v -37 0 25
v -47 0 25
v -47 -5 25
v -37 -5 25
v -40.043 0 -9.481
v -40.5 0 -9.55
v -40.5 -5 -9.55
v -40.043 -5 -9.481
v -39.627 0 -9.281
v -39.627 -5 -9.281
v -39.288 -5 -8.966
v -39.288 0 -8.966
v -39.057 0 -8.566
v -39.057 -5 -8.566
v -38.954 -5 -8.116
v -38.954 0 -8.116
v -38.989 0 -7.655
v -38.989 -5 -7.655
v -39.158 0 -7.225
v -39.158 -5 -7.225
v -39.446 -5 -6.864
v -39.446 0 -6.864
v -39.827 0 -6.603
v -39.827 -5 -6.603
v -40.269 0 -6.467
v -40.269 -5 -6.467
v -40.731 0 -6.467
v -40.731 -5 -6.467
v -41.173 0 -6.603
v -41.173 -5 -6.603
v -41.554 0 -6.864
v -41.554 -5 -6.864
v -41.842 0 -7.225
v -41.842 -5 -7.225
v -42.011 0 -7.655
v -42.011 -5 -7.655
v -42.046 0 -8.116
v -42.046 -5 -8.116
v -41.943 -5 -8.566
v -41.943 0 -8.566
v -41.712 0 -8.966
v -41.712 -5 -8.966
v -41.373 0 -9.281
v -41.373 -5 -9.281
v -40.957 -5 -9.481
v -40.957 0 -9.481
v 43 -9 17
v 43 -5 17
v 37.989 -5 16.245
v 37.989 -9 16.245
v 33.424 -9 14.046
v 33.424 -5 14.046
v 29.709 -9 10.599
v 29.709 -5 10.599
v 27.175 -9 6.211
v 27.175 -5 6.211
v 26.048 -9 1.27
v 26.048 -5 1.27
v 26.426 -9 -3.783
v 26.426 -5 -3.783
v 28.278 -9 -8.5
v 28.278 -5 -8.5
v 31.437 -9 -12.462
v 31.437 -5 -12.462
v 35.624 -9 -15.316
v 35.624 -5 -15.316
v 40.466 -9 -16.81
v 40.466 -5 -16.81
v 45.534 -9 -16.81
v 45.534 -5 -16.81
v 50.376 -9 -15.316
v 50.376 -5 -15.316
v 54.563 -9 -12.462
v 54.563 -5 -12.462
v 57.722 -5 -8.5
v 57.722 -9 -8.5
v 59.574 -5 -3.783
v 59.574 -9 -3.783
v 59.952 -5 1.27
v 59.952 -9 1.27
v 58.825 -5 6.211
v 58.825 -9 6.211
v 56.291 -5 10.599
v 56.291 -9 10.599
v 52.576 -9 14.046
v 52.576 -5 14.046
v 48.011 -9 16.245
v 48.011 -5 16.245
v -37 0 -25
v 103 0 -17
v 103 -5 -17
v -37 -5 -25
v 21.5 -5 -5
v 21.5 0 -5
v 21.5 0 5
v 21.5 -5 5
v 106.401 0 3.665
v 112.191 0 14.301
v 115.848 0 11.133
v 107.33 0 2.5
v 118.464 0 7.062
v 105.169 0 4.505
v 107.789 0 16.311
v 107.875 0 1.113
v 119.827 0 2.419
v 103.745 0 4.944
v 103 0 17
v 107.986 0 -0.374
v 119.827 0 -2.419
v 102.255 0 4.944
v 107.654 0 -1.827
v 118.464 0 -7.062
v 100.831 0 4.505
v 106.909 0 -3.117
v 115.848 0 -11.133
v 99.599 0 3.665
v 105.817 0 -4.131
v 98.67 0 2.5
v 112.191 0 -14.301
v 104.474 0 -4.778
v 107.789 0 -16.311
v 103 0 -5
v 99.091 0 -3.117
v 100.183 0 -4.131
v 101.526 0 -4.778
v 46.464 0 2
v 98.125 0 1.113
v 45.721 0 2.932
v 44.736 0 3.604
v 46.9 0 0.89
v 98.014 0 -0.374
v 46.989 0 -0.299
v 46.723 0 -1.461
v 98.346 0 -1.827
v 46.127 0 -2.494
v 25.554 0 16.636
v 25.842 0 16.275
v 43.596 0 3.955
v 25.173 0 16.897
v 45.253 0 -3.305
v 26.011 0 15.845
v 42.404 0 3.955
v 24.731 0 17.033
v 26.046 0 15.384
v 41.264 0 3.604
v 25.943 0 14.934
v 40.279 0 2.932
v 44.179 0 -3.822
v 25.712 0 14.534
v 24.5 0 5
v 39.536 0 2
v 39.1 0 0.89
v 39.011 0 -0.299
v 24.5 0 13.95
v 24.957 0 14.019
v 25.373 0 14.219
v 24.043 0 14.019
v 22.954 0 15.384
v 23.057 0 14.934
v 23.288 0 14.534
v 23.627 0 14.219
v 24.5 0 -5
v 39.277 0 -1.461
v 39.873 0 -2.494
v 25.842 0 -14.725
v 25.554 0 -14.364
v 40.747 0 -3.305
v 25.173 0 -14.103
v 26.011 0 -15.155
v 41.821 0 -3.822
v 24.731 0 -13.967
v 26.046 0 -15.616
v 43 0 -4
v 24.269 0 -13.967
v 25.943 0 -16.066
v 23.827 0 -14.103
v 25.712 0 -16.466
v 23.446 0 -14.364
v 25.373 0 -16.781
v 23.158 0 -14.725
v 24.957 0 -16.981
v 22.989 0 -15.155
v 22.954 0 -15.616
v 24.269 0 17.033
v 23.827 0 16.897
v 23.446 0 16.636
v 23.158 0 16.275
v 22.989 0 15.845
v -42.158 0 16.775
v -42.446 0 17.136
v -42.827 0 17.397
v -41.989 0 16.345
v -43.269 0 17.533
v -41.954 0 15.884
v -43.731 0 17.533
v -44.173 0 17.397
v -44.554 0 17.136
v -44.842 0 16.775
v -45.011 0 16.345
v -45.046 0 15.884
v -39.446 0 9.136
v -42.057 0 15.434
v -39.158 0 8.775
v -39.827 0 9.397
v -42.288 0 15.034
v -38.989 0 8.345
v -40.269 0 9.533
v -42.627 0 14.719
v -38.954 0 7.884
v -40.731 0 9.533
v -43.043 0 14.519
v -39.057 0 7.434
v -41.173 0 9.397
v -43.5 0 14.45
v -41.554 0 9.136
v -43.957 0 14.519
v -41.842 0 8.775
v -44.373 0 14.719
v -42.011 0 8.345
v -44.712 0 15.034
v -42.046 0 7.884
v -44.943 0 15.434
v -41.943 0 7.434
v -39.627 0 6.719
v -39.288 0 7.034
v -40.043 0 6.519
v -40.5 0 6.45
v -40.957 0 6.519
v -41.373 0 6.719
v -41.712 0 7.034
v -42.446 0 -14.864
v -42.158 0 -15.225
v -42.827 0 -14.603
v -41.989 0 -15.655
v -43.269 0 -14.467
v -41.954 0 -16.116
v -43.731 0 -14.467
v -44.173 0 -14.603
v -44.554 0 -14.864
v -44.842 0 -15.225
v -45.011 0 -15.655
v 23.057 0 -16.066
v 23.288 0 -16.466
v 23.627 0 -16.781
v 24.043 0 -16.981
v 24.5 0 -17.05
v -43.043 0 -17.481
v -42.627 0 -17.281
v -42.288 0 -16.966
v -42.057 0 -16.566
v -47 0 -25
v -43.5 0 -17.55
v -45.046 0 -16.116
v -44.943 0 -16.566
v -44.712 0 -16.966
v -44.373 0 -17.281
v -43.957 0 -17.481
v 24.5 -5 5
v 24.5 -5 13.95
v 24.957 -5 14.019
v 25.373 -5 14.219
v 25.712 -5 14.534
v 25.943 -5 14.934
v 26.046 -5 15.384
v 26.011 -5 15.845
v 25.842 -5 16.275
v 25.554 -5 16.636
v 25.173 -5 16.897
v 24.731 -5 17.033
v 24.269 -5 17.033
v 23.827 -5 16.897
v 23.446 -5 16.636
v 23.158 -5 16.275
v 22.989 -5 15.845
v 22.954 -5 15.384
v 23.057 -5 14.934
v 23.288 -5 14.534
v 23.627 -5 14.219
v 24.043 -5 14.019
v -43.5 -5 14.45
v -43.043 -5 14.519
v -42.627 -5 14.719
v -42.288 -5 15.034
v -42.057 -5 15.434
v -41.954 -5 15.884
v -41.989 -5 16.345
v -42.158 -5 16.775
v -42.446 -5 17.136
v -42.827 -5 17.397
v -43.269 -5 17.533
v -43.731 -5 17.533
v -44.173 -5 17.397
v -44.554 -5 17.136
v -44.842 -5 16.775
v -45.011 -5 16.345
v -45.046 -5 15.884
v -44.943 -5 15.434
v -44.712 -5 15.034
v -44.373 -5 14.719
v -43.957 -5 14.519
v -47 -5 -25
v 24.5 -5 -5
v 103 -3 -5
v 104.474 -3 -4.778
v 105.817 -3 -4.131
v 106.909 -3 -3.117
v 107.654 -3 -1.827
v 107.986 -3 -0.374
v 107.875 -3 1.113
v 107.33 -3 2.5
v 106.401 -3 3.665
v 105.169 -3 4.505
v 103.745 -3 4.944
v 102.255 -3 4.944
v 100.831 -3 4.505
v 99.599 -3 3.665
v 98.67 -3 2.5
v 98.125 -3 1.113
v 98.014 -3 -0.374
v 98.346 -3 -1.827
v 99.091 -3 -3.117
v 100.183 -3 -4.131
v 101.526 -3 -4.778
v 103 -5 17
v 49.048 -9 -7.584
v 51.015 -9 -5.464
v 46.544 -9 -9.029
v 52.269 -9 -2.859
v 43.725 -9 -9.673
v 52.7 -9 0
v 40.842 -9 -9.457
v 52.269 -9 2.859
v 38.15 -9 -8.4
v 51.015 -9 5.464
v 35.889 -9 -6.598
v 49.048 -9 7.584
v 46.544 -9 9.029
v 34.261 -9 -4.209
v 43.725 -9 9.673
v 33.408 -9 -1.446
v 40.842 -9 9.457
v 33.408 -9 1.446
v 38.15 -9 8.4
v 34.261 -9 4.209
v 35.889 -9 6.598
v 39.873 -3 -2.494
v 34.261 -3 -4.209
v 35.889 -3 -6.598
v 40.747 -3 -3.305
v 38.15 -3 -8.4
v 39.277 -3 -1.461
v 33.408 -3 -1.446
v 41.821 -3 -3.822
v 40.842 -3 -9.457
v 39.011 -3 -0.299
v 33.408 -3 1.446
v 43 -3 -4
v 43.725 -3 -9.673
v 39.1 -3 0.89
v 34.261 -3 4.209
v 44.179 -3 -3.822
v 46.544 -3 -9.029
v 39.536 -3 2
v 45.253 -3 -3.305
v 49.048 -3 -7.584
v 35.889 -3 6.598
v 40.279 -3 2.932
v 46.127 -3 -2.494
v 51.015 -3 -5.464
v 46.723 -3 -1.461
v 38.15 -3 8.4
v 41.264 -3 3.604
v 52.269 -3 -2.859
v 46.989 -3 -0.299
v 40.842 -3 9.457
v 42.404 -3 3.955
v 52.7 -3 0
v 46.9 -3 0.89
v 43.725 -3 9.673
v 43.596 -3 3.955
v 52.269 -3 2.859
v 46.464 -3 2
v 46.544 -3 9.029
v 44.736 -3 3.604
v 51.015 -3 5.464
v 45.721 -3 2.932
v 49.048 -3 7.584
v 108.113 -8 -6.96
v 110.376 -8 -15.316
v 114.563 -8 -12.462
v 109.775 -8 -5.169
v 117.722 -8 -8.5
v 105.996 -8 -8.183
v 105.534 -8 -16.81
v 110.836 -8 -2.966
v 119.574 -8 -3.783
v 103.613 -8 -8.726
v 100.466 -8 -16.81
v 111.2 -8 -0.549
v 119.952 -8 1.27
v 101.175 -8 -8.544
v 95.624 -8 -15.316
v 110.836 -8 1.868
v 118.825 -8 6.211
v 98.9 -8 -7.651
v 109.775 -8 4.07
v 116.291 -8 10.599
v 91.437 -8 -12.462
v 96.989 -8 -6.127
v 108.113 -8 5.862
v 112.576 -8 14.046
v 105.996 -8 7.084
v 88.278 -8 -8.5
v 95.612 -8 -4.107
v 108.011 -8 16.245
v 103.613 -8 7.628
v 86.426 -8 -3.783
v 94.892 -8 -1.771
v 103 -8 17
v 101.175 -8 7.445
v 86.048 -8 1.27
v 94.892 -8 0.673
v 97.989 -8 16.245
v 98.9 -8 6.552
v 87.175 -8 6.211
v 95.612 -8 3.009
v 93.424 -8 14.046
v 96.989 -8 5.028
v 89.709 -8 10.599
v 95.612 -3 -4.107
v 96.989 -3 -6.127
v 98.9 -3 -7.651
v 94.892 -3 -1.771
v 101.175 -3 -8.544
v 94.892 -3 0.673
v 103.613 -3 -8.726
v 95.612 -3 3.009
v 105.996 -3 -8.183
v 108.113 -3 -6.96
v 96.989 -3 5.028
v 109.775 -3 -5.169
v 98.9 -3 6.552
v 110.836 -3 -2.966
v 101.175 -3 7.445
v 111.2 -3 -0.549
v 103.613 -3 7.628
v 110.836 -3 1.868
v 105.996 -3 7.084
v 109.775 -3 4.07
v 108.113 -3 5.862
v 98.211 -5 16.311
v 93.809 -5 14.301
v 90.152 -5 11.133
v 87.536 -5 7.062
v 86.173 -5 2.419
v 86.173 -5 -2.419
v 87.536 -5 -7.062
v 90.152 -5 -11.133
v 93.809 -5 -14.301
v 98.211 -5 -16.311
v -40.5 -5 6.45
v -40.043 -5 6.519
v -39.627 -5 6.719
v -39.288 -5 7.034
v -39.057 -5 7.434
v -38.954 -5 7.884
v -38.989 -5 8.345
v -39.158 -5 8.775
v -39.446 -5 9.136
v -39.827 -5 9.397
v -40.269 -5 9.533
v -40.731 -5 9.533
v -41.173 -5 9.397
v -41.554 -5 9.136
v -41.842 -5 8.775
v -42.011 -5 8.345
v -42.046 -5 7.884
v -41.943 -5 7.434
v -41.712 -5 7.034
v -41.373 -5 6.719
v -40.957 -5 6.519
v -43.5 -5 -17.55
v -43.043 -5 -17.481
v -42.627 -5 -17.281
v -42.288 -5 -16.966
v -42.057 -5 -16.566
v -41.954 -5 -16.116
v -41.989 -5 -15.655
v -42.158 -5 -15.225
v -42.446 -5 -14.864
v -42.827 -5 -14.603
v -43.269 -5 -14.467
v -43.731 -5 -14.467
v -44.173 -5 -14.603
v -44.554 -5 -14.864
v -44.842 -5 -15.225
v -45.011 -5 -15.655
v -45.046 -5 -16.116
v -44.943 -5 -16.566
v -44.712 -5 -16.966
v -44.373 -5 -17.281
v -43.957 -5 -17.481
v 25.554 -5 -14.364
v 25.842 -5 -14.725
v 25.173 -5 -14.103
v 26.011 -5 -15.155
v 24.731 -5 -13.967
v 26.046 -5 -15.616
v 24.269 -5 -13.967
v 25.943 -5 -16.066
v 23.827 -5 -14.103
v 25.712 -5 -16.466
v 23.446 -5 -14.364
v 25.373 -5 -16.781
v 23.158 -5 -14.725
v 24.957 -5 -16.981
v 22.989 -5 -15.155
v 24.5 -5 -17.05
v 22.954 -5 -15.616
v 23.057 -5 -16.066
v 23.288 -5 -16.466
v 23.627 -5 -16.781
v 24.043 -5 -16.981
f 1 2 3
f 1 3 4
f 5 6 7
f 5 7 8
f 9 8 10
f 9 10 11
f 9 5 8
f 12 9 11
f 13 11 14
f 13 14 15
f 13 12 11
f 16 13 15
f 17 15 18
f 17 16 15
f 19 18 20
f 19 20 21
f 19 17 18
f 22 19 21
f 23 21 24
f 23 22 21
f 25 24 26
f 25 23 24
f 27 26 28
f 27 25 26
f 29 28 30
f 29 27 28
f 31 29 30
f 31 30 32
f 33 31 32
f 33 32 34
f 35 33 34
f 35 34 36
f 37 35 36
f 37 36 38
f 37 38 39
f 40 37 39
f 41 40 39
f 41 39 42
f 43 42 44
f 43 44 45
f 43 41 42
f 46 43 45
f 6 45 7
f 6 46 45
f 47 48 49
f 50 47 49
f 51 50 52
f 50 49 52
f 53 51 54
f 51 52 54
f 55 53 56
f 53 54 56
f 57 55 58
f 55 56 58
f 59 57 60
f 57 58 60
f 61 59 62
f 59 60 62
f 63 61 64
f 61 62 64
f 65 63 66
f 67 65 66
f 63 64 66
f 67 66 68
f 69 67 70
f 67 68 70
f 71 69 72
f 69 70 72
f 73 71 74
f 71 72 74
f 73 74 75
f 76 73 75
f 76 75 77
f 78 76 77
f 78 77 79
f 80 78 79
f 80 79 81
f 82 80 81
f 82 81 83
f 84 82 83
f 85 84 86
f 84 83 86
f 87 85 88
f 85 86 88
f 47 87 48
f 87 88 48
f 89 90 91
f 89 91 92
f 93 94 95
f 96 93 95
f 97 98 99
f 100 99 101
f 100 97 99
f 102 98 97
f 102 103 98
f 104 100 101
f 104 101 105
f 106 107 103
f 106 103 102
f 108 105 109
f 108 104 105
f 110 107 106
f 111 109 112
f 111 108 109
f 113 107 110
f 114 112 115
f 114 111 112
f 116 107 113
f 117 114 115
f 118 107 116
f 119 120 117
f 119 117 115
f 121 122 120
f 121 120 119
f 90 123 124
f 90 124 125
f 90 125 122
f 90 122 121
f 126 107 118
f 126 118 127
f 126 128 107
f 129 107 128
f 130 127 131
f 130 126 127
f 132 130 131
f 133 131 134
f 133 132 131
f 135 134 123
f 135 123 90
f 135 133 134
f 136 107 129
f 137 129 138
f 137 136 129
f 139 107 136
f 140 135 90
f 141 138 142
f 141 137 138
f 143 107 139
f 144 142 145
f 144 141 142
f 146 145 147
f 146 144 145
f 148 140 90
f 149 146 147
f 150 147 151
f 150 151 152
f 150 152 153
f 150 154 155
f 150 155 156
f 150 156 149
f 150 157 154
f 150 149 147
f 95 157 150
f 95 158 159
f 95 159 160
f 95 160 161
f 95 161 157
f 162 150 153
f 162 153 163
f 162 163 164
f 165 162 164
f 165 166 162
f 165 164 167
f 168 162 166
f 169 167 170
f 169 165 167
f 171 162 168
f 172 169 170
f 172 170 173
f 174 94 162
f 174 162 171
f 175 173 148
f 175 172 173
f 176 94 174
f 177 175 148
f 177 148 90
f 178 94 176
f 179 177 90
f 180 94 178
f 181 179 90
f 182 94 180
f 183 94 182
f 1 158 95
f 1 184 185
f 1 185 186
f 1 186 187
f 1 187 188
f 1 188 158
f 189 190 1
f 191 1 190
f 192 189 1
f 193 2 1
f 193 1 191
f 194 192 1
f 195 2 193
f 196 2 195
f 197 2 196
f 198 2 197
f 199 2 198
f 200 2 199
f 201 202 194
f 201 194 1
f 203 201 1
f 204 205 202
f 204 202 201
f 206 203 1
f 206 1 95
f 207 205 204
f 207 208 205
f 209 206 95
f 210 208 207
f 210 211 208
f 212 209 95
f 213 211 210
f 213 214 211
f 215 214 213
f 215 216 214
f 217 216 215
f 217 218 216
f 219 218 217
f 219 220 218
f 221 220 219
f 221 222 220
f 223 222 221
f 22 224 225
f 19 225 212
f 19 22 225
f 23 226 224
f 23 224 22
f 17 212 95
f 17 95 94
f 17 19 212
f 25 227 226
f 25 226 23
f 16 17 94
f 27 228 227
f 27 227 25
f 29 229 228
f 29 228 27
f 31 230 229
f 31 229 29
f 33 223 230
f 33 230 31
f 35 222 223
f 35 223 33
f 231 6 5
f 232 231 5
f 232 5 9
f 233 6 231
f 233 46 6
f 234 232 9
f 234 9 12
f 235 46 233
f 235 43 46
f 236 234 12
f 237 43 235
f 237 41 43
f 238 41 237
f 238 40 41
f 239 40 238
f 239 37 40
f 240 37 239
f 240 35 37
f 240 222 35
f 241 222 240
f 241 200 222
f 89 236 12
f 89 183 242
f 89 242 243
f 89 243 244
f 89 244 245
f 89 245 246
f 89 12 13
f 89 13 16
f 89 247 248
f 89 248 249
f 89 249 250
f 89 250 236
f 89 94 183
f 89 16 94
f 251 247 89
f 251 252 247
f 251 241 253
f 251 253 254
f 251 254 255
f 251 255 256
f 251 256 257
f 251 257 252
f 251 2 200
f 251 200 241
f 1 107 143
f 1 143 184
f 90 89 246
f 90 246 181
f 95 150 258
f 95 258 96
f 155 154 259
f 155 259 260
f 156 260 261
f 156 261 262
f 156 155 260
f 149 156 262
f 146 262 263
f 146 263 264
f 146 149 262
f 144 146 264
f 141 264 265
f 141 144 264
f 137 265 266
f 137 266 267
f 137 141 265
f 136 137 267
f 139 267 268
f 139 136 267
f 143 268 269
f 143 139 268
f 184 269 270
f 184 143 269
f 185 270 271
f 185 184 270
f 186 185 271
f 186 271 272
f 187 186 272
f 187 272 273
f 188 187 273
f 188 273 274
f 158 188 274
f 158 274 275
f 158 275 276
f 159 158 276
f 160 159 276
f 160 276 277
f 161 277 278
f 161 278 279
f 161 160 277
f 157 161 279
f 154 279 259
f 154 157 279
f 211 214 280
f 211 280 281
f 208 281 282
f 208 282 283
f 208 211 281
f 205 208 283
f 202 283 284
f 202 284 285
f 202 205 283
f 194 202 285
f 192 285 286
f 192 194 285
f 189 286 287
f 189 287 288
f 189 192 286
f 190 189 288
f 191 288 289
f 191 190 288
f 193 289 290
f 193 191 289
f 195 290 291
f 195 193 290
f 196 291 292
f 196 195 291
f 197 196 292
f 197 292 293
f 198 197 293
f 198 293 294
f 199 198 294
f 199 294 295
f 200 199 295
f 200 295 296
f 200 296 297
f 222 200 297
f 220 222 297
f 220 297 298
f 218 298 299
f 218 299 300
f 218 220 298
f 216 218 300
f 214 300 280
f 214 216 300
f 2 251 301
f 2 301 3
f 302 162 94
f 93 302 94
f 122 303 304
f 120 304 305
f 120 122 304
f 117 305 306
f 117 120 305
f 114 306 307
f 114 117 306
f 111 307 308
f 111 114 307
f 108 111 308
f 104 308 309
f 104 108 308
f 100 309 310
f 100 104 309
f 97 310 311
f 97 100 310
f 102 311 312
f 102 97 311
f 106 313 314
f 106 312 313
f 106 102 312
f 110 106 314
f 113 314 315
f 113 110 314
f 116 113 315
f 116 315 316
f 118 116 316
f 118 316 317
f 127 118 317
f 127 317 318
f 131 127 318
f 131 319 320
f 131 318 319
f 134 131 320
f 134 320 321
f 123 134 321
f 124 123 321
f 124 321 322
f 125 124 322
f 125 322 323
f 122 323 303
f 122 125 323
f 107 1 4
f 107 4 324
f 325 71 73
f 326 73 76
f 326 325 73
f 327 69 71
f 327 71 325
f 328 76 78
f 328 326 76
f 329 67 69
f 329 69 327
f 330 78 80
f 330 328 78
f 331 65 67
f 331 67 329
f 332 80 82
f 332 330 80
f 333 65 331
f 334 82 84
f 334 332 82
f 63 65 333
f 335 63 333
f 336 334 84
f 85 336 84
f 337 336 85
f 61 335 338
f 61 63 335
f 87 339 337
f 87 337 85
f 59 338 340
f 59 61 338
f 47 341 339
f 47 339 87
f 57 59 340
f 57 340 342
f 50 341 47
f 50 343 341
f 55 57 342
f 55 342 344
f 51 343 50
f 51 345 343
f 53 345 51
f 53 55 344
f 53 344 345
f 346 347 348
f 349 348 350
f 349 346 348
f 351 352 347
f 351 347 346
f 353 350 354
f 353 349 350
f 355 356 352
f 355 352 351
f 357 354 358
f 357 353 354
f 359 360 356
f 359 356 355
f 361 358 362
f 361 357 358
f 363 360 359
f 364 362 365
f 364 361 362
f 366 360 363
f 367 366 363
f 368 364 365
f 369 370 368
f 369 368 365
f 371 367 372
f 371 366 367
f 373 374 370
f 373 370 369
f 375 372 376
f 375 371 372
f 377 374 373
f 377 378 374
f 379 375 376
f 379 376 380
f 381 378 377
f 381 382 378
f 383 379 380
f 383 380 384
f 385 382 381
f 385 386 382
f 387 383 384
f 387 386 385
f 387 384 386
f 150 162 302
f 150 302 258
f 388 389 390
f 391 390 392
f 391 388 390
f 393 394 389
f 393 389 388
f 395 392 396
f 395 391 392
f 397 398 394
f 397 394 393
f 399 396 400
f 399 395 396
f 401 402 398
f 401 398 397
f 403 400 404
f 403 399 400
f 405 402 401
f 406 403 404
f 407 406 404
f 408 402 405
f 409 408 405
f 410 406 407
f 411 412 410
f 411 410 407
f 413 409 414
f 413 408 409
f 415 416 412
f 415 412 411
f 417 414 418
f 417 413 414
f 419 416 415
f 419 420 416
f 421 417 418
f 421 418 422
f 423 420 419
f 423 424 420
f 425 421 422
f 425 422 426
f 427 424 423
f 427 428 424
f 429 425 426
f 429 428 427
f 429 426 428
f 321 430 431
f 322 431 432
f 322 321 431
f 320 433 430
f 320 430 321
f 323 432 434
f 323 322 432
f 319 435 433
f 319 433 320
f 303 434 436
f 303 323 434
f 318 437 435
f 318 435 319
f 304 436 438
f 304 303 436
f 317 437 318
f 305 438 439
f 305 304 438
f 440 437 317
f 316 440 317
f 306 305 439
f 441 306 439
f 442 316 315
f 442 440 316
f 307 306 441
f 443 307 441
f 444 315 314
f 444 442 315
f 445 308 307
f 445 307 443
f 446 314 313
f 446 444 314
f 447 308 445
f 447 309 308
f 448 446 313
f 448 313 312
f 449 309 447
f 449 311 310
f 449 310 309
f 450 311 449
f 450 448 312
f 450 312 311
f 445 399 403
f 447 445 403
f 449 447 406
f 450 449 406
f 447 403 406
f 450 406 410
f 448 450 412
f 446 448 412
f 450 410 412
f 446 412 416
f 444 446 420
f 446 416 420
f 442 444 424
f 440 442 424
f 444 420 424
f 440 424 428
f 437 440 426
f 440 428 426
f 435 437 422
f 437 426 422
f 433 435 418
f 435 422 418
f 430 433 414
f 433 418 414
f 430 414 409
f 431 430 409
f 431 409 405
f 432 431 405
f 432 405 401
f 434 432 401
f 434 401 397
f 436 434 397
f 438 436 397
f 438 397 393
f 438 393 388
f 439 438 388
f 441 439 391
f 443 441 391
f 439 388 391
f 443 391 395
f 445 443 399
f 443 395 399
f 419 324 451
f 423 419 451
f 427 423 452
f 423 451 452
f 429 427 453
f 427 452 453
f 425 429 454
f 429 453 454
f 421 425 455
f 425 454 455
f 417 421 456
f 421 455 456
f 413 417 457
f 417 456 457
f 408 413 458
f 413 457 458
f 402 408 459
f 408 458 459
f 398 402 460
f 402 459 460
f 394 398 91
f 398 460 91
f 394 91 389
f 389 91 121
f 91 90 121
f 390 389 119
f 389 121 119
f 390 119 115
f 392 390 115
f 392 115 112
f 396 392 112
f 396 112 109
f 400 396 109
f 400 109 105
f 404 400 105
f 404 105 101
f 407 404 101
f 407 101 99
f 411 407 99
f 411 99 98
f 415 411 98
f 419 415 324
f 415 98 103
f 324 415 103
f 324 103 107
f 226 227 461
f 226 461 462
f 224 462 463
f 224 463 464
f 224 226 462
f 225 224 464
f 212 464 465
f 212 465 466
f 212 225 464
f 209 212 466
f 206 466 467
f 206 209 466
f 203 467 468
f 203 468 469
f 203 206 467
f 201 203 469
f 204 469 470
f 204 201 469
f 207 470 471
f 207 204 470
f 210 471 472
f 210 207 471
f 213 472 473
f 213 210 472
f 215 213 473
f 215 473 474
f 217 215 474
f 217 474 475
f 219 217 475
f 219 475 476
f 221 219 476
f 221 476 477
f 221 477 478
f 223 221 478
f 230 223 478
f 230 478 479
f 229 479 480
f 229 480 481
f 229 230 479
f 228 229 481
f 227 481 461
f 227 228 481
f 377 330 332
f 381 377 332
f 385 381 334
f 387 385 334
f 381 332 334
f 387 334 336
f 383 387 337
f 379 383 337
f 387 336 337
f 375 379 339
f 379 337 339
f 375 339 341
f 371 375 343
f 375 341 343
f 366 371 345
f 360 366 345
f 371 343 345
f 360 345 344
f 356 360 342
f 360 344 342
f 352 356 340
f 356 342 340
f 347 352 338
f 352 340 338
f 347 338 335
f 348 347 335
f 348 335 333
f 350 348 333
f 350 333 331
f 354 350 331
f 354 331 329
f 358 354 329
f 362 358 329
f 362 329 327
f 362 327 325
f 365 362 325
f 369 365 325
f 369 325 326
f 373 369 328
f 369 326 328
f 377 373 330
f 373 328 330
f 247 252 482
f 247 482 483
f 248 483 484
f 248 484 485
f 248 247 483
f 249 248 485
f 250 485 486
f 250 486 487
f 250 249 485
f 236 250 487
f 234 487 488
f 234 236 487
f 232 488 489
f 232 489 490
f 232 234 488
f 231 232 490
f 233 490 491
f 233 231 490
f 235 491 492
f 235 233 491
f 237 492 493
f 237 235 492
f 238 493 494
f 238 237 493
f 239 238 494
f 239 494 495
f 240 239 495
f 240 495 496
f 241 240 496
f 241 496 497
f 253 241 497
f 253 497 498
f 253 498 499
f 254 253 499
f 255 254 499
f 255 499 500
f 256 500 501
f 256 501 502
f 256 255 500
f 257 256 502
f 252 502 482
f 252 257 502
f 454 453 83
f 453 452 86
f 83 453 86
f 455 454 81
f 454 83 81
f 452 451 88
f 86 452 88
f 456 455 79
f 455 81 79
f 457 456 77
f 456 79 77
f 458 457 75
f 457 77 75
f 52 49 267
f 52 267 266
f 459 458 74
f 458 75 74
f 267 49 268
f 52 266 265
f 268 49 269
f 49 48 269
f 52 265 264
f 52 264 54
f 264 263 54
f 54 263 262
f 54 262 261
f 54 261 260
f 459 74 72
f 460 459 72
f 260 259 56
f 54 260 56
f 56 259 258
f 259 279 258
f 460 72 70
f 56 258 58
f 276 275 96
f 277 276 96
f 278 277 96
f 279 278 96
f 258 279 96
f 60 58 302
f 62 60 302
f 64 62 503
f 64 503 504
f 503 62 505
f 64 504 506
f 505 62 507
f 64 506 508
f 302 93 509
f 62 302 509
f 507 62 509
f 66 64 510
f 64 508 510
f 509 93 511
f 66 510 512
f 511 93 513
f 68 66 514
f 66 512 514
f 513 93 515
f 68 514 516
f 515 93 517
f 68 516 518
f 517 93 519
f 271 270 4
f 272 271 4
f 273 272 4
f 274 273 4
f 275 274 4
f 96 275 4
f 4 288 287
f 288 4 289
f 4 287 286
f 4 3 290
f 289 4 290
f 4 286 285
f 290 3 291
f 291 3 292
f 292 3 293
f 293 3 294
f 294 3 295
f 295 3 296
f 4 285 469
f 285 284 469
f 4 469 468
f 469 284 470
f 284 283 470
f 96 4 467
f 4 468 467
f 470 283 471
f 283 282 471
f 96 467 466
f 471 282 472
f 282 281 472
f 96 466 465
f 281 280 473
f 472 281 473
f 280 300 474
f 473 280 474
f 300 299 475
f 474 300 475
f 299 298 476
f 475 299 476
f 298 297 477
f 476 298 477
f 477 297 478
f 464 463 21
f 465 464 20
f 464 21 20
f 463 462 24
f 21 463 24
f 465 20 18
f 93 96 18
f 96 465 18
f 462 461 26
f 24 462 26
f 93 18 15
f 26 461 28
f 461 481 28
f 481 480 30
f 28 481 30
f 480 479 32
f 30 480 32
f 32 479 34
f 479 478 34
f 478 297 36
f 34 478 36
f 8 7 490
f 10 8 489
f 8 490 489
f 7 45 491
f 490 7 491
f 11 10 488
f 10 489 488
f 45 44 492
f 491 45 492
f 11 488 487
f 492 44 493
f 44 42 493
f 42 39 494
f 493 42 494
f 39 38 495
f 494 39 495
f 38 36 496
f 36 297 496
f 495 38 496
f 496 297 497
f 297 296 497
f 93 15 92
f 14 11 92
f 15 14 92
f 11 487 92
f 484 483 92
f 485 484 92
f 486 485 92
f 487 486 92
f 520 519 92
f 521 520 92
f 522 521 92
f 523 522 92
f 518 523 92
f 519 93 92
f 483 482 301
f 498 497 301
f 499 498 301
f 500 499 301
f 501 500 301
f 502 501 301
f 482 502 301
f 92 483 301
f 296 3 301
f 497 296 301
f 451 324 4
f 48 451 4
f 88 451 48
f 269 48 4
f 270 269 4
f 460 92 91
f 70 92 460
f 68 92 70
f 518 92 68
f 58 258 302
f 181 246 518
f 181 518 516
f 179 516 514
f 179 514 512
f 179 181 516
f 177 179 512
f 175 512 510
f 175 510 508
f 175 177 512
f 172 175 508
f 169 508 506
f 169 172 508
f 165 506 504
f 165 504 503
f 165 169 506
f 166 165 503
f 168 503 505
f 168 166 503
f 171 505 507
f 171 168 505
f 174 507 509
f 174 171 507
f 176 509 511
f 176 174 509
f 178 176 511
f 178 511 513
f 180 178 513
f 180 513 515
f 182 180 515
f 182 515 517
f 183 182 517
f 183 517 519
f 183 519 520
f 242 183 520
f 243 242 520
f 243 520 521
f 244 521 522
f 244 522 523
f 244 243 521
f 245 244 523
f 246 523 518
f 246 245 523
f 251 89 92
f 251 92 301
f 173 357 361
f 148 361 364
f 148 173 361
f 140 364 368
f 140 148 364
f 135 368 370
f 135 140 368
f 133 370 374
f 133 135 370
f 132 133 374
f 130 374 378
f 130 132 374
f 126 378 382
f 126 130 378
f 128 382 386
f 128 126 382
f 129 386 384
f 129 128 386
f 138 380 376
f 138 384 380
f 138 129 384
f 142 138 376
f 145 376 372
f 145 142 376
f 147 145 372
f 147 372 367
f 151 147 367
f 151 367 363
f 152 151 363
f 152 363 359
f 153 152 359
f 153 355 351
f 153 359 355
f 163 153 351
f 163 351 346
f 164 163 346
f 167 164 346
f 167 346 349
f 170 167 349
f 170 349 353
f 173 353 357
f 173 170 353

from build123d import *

# Parameters (mm, degrees)
SKETCH28_R           = 5
SKETCH28_R_2         = 4
SKETCH28_R_3         = 1.55
SKETCH28_W           = 10
SKETCH28_H           = 3
BOSS_EXTRUDE10_DEPTH = 5
SKETCH25_R           = 17
BOSS_EXTRUDE8_DEPTH  = 3
SKETCH30_R           = 17
BOSS_EXTRUDE11_DEPTH = 4
SKETCH32_R           = 9.7
CUT_EXTRUDE3_DEPTH   = 6
SKETCH33_R           = 8.2
CUT_EXTRUDE4_DEPTH   = 5


with BuildPart() as part:
    # Sketch28 → Boss-Extrude10 (new body)
    with BuildSketch(Plane(origin=(-32, 0, 0), x_dir=(0, 0, 1), z_dir=(0, -1, 0))):
        with BuildLine():
            Line((-25, 15), (25, 15))
            Line((25, 15), (25, 5))
            Line((25, 5), (17, -135))
            ThreePointArc((17, -135), (0, -152), (-17, -135))
            Line((-17, -135), (-25, 5))
            Line((-25, 5), (-25, 15))
        make_face()
        with Locations(Location((0, -135, 0), (0, 0, 180))):
            Circle(SKETCH28_R, mode=Mode.SUBTRACT)
        with Locations(Location((0, -75, 0), (0, 0, 180))):
            Circle(SKETCH28_R_2, mode=Mode.SUBTRACT)
        with Locations(Location((8, 8.5, 0), (0, 0, 180))):
            Circle(SKETCH28_R_3, mode=Mode.SUBTRACT)
        with Locations(Location((-8, 8.5, 0), (0, 0, 180))):
            Circle(SKETCH28_R_3, mode=Mode.SUBTRACT)
        with Locations(Location((16, 11.5, 0), (0, 0, 180))):
            Circle(SKETCH28_R_3, mode=Mode.SUBTRACT)
        with Locations(Location((-16, 11.5, 0), (0, 0, 180))):
            Circle(SKETCH28_R_3, mode=Mode.SUBTRACT)
        with Locations(Location((-15.5, -56.5, 0), (0, 0, 180))):
            Circle(SKETCH28_R_3, mode=Mode.SUBTRACT)
        with Locations(Location((15.5, -56.5, 0), (0, 0, 180))):
            Circle(SKETCH28_R_3, mode=Mode.SUBTRACT)
        with Locations((0, -55)):
            Rectangle(SKETCH28_W, SKETCH28_H, mode=Mode.SUBTRACT)
    extrude(amount=BOSS_EXTRUDE10_DEPTH)

    # Sketch25 → Boss-Extrude8 (add)
    with BuildSketch(Plane(origin=(0, -5, 0), x_dir=(0, 0, 1), z_dir=(0, -1, 0))):
        with Locations((0, -103)):
            Circle(SKETCH25_R)
    extrude(amount=BOSS_EXTRUDE8_DEPTH)

    # Sketch30 → Boss-Extrude11 (add)
    with BuildSketch(Plane(origin=(0, -5, 0), x_dir=(0, 0, 1), z_dir=(0, -1, 0))):
        with Locations((0, -43)):
            Circle(SKETCH30_R)
    extrude(amount=BOSS_EXTRUDE11_DEPTH)

    # Sketch32 → Cut-Extrude3 (cut)
    with BuildSketch(Plane.XZ.offset(9)):
        with Locations((43, 0)):
            Circle(SKETCH32_R)
    extrude(amount=-CUT_EXTRUDE3_DEPTH, mode=Mode.SUBTRACT)

    # Sketch33 → Cut-Extrude4 (cut)
    with BuildSketch(Plane.XZ.offset(8)):
        with Locations((103, -0.549344368)):
            Circle(SKETCH33_R)
    extrude(amount=-CUT_EXTRUDE4_DEPTH, mode=Mode.SUBTRACT)


solid = part.part
